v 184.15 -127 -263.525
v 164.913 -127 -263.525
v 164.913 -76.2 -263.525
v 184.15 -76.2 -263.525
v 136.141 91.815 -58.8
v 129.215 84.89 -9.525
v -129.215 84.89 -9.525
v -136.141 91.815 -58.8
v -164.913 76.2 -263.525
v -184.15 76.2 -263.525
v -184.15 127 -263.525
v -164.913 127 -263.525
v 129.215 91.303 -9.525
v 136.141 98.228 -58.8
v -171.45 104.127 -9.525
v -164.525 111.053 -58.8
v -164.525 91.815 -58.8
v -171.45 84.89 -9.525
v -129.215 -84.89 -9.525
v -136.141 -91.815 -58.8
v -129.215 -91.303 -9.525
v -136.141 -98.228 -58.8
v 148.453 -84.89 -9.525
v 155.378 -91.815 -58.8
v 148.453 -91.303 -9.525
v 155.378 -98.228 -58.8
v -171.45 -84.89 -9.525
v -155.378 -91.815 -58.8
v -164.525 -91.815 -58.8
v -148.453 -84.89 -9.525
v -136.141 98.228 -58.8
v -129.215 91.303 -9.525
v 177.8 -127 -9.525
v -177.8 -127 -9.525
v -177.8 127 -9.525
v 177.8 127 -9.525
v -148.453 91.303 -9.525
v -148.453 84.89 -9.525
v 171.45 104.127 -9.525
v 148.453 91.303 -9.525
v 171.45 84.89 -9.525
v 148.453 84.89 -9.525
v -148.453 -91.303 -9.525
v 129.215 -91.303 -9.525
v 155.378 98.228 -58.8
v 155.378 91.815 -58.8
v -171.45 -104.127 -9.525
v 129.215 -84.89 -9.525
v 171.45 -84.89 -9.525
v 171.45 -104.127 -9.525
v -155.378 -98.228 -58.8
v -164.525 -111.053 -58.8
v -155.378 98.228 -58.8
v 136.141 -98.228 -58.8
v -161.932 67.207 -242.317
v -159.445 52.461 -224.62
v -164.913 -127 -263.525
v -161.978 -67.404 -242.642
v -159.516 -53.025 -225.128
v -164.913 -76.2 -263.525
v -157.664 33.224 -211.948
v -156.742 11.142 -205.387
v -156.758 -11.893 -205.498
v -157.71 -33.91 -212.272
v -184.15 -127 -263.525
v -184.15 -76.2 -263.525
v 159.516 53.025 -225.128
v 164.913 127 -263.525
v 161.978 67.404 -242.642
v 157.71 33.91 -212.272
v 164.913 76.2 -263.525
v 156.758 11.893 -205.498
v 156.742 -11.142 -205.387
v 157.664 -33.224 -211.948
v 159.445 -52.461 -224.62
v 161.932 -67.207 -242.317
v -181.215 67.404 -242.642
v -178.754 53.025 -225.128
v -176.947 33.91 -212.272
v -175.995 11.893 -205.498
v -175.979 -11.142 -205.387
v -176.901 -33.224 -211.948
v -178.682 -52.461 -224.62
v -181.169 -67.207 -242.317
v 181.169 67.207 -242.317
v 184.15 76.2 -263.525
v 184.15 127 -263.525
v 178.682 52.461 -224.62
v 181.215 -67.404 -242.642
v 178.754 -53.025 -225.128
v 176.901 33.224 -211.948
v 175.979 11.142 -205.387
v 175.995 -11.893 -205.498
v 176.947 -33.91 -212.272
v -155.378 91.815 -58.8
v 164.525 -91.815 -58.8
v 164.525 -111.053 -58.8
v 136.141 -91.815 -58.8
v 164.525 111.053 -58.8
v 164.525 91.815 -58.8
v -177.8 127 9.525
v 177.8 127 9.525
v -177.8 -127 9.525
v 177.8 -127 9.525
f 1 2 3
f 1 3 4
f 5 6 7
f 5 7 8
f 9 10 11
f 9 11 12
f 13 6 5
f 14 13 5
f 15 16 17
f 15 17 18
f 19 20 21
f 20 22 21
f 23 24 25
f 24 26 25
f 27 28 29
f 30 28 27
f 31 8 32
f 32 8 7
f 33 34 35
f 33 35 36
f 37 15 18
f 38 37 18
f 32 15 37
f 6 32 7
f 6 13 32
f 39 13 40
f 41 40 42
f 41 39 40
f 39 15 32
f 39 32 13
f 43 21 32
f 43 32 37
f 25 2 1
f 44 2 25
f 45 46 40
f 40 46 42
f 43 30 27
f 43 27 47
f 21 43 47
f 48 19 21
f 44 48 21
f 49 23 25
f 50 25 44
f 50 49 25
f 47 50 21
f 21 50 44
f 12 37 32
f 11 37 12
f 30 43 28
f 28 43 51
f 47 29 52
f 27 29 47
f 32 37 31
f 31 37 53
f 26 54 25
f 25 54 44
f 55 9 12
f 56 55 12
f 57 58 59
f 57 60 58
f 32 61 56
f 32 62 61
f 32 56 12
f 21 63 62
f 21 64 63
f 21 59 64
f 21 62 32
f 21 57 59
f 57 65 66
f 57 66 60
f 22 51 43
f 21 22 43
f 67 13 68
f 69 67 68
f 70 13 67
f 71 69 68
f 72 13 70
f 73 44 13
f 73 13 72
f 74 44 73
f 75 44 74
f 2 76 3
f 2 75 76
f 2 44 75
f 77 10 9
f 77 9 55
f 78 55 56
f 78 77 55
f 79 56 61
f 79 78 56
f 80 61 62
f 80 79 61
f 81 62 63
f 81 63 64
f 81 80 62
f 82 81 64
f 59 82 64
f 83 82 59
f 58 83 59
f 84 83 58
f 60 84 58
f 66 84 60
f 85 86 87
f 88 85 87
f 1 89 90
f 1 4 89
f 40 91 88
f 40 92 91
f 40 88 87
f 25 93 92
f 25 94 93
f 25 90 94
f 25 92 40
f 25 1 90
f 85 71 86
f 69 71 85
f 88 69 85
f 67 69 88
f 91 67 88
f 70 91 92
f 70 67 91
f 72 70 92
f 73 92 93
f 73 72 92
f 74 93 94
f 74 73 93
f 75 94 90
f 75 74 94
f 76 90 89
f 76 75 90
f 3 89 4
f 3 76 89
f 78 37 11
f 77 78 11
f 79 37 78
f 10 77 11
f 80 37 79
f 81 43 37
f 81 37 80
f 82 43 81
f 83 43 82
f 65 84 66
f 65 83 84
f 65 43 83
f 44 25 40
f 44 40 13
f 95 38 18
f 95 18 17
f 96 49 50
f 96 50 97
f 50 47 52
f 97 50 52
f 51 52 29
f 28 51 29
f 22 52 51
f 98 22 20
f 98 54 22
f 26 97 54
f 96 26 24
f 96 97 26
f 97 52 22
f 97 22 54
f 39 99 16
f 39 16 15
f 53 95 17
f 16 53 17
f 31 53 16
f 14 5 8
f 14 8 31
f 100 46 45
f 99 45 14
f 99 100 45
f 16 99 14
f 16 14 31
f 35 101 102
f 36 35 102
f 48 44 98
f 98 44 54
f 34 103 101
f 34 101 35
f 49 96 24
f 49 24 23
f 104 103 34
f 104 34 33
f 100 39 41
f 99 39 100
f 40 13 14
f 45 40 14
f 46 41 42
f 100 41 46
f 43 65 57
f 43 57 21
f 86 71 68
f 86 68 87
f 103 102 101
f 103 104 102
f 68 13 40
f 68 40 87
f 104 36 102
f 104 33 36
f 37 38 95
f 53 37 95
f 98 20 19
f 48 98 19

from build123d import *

# Parameters (mm, degrees)
F1_DEPTH      = 127
F2_DEPTH      = 127
F2_DEPTH_BACK = 127
F4_DEPTH      = 184.151
F4_DEPTH_BACK = 184.151
F6_DEPTH      = 177.8
F6_DEPTH_BACK = 177.8
F7_DEPTH      = 127.001
F7_DEPTH_BACK = 127.001


with BuildPart() as f1:
    # F0 (on Front) → F1 (new body, symmetric)
    with BuildSketch(Plane.XZ):
        Polygon((177.8, 9.525), (-177.8, 9.525), (-177.8, -9.525), (-171.45, -9.525), (-148.4526279856, -9.525), (-129.2154127291, -9.525), (129.2154127291, -9.525), (148.4526279856, -9.525), (171.45, -9.525), (177.8, -9.525), align=None)
    extrude(amount=F1_DEPTH, both=True)


with BuildPart() as f2:
    # F0 (on Front) → F2 (new body, two sides)
    with BuildSketch(Plane.XZ) as f2_sk:
        Polygon((-136.1406175943, -58.8003930194), (-155.3778328508, -58.8003930194), (-184.15, -263.525), (-164.9127847435, -263.525), align=None)
        Polygon((-129.2154127291, -9.525), (-148.4526279856, -9.525), (-155.3778328508, -58.8003930194), (-136.1406175943, -58.8003930194), align=None)
    extrude(amount=F2_DEPTH)
    extrude(f2_sk.sketch, amount=-F2_DEPTH_BACK)


with BuildPart() as f2b:
    # F0 (on Front) → F2, piece 2 (new body, two sides)
    with BuildSketch(Plane.XZ) as f2_2_sk:
        Polygon((155.3778328508, -58.8003930194), (148.4526279856, -9.525), (129.2154127291, -9.525), (136.1406175943, -58.8003930194), align=None)
        Polygon((184.15, -263.525), (155.3778328508, -58.8003930194), (136.1406175943, -58.8003930194), (164.9127847435, -263.525), align=None)
    extrude(amount=F2_DEPTH)
    extrude(f2_2_sk.sketch, amount=-F2_DEPTH_BACK)


with BuildPart() as f4_tool:
    # F3 (on Right) → F4 (new body, two sides)
    with BuildSketch(Plane.YZ) as f4_sk:
        Polygon((-127, -263.525), (-91.3026279856, -9.525), (-127, -9.525), align=None)
        Polygon((127, -263.525), (127, -9.525), (91.3026279856, -9.525), align=None)
        with BuildLine():
            Line((-76.2, -263.525), (76.2, -263.525))
            ThreePointArc((76.2, -263.525), (0, -204.5948043473), (-76.2, -263.525))
        make_face()
    extrude(amount=-F4_DEPTH)
    extrude(f4_sk.sketch, amount=F4_DEPTH_BACK)


with BuildPart() as f2_1:
    add(f2.part)

    # F4: cut by f4_tool
    add(f4_tool.part, mode=Mode.SUBTRACT)


with BuildPart() as f2b_1:
    add(f2b.part)

    # F4: cut by f4_tool
    add(f4_tool.part, mode=Mode.SUBTRACT)


with BuildPart() as f6:
    # F5 (on Right) → F6 (new body, two sides)
    with BuildSketch(Plane.YZ) as f6_sk:
        Polygon((-111.0526430218, -58.8003930194), (-98.2278328508, -58.8003930194), (-91.3026279856, -9.525), (-104.1274381566, -9.525), align=None)
        Polygon((-91.8154277653, -58.8003930194), (-84.8902229001, -9.525), (-91.3026279858, -9.525), (-98.2278328508, -58.8003930194), align=None)
    extrude(amount=F6_DEPTH)
    extrude(f6_sk.sketch, amount=-F6_DEPTH_BACK)


with BuildPart() as f6b:
    # F5 (on Right) → F6, piece 2 (new body, two sides)
    with BuildSketch(Plane.YZ) as f6_2_sk:
        Polygon((91.8154277653, -58.8003930194), (98.2278328508, -58.8003930194), (91.3026279856, -9.525), (84.8902229001, -9.525), align=None)
        Polygon((91.3026279856, -9.525), (98.2278328508, -58.8003930194), (111.0526430218, -58.8003930194), (104.1274381566, -9.525), align=None)
    extrude(amount=F6_DEPTH)
    extrude(f6_2_sk.sketch, amount=-F6_DEPTH_BACK)


with BuildPart() as f7_tool:
    # F0 (on Front) → F7 (new body, two sides)
    with BuildSketch(Plane.XZ) as f7_sk:
        Polygon((177.8, -58.8003930194), (177.8, -9.525), (171.45, -9.525), (164.5247951348, -58.8003930194), align=None)
        Polygon((-171.45, -9.525), (-177.8, -9.525), (-177.8, -58.8003930194), (-164.5247951348, -58.8003930194), align=None)
    extrude(amount=-F7_DEPTH)
    extrude(f7_sk.sketch, amount=F7_DEPTH_BACK)


with BuildPart() as f6_1:
    add(f6.part)

    # F7: cut by f7_tool
    add(f7_tool.part, mode=Mode.SUBTRACT)

    # F8: cut F2, F2b
    add(f2_1.part, mode=Mode.SUBTRACT)
    add(f2b_1.part, mode=Mode.SUBTRACT)


with BuildPart() as f6b_1:
    add(f6b.part)

    # F7: cut by f7_tool
    add(f7_tool.part, mode=Mode.SUBTRACT)

    # F8: cut F2, F2b
    add(f2_1.part, mode=Mode.SUBTRACT)
    add(f2b_1.part, mode=Mode.SUBTRACT)


solid = Compound([f1.part, f2_1.part, f2b_1.part, f6_1.part, f6b_1.part])
